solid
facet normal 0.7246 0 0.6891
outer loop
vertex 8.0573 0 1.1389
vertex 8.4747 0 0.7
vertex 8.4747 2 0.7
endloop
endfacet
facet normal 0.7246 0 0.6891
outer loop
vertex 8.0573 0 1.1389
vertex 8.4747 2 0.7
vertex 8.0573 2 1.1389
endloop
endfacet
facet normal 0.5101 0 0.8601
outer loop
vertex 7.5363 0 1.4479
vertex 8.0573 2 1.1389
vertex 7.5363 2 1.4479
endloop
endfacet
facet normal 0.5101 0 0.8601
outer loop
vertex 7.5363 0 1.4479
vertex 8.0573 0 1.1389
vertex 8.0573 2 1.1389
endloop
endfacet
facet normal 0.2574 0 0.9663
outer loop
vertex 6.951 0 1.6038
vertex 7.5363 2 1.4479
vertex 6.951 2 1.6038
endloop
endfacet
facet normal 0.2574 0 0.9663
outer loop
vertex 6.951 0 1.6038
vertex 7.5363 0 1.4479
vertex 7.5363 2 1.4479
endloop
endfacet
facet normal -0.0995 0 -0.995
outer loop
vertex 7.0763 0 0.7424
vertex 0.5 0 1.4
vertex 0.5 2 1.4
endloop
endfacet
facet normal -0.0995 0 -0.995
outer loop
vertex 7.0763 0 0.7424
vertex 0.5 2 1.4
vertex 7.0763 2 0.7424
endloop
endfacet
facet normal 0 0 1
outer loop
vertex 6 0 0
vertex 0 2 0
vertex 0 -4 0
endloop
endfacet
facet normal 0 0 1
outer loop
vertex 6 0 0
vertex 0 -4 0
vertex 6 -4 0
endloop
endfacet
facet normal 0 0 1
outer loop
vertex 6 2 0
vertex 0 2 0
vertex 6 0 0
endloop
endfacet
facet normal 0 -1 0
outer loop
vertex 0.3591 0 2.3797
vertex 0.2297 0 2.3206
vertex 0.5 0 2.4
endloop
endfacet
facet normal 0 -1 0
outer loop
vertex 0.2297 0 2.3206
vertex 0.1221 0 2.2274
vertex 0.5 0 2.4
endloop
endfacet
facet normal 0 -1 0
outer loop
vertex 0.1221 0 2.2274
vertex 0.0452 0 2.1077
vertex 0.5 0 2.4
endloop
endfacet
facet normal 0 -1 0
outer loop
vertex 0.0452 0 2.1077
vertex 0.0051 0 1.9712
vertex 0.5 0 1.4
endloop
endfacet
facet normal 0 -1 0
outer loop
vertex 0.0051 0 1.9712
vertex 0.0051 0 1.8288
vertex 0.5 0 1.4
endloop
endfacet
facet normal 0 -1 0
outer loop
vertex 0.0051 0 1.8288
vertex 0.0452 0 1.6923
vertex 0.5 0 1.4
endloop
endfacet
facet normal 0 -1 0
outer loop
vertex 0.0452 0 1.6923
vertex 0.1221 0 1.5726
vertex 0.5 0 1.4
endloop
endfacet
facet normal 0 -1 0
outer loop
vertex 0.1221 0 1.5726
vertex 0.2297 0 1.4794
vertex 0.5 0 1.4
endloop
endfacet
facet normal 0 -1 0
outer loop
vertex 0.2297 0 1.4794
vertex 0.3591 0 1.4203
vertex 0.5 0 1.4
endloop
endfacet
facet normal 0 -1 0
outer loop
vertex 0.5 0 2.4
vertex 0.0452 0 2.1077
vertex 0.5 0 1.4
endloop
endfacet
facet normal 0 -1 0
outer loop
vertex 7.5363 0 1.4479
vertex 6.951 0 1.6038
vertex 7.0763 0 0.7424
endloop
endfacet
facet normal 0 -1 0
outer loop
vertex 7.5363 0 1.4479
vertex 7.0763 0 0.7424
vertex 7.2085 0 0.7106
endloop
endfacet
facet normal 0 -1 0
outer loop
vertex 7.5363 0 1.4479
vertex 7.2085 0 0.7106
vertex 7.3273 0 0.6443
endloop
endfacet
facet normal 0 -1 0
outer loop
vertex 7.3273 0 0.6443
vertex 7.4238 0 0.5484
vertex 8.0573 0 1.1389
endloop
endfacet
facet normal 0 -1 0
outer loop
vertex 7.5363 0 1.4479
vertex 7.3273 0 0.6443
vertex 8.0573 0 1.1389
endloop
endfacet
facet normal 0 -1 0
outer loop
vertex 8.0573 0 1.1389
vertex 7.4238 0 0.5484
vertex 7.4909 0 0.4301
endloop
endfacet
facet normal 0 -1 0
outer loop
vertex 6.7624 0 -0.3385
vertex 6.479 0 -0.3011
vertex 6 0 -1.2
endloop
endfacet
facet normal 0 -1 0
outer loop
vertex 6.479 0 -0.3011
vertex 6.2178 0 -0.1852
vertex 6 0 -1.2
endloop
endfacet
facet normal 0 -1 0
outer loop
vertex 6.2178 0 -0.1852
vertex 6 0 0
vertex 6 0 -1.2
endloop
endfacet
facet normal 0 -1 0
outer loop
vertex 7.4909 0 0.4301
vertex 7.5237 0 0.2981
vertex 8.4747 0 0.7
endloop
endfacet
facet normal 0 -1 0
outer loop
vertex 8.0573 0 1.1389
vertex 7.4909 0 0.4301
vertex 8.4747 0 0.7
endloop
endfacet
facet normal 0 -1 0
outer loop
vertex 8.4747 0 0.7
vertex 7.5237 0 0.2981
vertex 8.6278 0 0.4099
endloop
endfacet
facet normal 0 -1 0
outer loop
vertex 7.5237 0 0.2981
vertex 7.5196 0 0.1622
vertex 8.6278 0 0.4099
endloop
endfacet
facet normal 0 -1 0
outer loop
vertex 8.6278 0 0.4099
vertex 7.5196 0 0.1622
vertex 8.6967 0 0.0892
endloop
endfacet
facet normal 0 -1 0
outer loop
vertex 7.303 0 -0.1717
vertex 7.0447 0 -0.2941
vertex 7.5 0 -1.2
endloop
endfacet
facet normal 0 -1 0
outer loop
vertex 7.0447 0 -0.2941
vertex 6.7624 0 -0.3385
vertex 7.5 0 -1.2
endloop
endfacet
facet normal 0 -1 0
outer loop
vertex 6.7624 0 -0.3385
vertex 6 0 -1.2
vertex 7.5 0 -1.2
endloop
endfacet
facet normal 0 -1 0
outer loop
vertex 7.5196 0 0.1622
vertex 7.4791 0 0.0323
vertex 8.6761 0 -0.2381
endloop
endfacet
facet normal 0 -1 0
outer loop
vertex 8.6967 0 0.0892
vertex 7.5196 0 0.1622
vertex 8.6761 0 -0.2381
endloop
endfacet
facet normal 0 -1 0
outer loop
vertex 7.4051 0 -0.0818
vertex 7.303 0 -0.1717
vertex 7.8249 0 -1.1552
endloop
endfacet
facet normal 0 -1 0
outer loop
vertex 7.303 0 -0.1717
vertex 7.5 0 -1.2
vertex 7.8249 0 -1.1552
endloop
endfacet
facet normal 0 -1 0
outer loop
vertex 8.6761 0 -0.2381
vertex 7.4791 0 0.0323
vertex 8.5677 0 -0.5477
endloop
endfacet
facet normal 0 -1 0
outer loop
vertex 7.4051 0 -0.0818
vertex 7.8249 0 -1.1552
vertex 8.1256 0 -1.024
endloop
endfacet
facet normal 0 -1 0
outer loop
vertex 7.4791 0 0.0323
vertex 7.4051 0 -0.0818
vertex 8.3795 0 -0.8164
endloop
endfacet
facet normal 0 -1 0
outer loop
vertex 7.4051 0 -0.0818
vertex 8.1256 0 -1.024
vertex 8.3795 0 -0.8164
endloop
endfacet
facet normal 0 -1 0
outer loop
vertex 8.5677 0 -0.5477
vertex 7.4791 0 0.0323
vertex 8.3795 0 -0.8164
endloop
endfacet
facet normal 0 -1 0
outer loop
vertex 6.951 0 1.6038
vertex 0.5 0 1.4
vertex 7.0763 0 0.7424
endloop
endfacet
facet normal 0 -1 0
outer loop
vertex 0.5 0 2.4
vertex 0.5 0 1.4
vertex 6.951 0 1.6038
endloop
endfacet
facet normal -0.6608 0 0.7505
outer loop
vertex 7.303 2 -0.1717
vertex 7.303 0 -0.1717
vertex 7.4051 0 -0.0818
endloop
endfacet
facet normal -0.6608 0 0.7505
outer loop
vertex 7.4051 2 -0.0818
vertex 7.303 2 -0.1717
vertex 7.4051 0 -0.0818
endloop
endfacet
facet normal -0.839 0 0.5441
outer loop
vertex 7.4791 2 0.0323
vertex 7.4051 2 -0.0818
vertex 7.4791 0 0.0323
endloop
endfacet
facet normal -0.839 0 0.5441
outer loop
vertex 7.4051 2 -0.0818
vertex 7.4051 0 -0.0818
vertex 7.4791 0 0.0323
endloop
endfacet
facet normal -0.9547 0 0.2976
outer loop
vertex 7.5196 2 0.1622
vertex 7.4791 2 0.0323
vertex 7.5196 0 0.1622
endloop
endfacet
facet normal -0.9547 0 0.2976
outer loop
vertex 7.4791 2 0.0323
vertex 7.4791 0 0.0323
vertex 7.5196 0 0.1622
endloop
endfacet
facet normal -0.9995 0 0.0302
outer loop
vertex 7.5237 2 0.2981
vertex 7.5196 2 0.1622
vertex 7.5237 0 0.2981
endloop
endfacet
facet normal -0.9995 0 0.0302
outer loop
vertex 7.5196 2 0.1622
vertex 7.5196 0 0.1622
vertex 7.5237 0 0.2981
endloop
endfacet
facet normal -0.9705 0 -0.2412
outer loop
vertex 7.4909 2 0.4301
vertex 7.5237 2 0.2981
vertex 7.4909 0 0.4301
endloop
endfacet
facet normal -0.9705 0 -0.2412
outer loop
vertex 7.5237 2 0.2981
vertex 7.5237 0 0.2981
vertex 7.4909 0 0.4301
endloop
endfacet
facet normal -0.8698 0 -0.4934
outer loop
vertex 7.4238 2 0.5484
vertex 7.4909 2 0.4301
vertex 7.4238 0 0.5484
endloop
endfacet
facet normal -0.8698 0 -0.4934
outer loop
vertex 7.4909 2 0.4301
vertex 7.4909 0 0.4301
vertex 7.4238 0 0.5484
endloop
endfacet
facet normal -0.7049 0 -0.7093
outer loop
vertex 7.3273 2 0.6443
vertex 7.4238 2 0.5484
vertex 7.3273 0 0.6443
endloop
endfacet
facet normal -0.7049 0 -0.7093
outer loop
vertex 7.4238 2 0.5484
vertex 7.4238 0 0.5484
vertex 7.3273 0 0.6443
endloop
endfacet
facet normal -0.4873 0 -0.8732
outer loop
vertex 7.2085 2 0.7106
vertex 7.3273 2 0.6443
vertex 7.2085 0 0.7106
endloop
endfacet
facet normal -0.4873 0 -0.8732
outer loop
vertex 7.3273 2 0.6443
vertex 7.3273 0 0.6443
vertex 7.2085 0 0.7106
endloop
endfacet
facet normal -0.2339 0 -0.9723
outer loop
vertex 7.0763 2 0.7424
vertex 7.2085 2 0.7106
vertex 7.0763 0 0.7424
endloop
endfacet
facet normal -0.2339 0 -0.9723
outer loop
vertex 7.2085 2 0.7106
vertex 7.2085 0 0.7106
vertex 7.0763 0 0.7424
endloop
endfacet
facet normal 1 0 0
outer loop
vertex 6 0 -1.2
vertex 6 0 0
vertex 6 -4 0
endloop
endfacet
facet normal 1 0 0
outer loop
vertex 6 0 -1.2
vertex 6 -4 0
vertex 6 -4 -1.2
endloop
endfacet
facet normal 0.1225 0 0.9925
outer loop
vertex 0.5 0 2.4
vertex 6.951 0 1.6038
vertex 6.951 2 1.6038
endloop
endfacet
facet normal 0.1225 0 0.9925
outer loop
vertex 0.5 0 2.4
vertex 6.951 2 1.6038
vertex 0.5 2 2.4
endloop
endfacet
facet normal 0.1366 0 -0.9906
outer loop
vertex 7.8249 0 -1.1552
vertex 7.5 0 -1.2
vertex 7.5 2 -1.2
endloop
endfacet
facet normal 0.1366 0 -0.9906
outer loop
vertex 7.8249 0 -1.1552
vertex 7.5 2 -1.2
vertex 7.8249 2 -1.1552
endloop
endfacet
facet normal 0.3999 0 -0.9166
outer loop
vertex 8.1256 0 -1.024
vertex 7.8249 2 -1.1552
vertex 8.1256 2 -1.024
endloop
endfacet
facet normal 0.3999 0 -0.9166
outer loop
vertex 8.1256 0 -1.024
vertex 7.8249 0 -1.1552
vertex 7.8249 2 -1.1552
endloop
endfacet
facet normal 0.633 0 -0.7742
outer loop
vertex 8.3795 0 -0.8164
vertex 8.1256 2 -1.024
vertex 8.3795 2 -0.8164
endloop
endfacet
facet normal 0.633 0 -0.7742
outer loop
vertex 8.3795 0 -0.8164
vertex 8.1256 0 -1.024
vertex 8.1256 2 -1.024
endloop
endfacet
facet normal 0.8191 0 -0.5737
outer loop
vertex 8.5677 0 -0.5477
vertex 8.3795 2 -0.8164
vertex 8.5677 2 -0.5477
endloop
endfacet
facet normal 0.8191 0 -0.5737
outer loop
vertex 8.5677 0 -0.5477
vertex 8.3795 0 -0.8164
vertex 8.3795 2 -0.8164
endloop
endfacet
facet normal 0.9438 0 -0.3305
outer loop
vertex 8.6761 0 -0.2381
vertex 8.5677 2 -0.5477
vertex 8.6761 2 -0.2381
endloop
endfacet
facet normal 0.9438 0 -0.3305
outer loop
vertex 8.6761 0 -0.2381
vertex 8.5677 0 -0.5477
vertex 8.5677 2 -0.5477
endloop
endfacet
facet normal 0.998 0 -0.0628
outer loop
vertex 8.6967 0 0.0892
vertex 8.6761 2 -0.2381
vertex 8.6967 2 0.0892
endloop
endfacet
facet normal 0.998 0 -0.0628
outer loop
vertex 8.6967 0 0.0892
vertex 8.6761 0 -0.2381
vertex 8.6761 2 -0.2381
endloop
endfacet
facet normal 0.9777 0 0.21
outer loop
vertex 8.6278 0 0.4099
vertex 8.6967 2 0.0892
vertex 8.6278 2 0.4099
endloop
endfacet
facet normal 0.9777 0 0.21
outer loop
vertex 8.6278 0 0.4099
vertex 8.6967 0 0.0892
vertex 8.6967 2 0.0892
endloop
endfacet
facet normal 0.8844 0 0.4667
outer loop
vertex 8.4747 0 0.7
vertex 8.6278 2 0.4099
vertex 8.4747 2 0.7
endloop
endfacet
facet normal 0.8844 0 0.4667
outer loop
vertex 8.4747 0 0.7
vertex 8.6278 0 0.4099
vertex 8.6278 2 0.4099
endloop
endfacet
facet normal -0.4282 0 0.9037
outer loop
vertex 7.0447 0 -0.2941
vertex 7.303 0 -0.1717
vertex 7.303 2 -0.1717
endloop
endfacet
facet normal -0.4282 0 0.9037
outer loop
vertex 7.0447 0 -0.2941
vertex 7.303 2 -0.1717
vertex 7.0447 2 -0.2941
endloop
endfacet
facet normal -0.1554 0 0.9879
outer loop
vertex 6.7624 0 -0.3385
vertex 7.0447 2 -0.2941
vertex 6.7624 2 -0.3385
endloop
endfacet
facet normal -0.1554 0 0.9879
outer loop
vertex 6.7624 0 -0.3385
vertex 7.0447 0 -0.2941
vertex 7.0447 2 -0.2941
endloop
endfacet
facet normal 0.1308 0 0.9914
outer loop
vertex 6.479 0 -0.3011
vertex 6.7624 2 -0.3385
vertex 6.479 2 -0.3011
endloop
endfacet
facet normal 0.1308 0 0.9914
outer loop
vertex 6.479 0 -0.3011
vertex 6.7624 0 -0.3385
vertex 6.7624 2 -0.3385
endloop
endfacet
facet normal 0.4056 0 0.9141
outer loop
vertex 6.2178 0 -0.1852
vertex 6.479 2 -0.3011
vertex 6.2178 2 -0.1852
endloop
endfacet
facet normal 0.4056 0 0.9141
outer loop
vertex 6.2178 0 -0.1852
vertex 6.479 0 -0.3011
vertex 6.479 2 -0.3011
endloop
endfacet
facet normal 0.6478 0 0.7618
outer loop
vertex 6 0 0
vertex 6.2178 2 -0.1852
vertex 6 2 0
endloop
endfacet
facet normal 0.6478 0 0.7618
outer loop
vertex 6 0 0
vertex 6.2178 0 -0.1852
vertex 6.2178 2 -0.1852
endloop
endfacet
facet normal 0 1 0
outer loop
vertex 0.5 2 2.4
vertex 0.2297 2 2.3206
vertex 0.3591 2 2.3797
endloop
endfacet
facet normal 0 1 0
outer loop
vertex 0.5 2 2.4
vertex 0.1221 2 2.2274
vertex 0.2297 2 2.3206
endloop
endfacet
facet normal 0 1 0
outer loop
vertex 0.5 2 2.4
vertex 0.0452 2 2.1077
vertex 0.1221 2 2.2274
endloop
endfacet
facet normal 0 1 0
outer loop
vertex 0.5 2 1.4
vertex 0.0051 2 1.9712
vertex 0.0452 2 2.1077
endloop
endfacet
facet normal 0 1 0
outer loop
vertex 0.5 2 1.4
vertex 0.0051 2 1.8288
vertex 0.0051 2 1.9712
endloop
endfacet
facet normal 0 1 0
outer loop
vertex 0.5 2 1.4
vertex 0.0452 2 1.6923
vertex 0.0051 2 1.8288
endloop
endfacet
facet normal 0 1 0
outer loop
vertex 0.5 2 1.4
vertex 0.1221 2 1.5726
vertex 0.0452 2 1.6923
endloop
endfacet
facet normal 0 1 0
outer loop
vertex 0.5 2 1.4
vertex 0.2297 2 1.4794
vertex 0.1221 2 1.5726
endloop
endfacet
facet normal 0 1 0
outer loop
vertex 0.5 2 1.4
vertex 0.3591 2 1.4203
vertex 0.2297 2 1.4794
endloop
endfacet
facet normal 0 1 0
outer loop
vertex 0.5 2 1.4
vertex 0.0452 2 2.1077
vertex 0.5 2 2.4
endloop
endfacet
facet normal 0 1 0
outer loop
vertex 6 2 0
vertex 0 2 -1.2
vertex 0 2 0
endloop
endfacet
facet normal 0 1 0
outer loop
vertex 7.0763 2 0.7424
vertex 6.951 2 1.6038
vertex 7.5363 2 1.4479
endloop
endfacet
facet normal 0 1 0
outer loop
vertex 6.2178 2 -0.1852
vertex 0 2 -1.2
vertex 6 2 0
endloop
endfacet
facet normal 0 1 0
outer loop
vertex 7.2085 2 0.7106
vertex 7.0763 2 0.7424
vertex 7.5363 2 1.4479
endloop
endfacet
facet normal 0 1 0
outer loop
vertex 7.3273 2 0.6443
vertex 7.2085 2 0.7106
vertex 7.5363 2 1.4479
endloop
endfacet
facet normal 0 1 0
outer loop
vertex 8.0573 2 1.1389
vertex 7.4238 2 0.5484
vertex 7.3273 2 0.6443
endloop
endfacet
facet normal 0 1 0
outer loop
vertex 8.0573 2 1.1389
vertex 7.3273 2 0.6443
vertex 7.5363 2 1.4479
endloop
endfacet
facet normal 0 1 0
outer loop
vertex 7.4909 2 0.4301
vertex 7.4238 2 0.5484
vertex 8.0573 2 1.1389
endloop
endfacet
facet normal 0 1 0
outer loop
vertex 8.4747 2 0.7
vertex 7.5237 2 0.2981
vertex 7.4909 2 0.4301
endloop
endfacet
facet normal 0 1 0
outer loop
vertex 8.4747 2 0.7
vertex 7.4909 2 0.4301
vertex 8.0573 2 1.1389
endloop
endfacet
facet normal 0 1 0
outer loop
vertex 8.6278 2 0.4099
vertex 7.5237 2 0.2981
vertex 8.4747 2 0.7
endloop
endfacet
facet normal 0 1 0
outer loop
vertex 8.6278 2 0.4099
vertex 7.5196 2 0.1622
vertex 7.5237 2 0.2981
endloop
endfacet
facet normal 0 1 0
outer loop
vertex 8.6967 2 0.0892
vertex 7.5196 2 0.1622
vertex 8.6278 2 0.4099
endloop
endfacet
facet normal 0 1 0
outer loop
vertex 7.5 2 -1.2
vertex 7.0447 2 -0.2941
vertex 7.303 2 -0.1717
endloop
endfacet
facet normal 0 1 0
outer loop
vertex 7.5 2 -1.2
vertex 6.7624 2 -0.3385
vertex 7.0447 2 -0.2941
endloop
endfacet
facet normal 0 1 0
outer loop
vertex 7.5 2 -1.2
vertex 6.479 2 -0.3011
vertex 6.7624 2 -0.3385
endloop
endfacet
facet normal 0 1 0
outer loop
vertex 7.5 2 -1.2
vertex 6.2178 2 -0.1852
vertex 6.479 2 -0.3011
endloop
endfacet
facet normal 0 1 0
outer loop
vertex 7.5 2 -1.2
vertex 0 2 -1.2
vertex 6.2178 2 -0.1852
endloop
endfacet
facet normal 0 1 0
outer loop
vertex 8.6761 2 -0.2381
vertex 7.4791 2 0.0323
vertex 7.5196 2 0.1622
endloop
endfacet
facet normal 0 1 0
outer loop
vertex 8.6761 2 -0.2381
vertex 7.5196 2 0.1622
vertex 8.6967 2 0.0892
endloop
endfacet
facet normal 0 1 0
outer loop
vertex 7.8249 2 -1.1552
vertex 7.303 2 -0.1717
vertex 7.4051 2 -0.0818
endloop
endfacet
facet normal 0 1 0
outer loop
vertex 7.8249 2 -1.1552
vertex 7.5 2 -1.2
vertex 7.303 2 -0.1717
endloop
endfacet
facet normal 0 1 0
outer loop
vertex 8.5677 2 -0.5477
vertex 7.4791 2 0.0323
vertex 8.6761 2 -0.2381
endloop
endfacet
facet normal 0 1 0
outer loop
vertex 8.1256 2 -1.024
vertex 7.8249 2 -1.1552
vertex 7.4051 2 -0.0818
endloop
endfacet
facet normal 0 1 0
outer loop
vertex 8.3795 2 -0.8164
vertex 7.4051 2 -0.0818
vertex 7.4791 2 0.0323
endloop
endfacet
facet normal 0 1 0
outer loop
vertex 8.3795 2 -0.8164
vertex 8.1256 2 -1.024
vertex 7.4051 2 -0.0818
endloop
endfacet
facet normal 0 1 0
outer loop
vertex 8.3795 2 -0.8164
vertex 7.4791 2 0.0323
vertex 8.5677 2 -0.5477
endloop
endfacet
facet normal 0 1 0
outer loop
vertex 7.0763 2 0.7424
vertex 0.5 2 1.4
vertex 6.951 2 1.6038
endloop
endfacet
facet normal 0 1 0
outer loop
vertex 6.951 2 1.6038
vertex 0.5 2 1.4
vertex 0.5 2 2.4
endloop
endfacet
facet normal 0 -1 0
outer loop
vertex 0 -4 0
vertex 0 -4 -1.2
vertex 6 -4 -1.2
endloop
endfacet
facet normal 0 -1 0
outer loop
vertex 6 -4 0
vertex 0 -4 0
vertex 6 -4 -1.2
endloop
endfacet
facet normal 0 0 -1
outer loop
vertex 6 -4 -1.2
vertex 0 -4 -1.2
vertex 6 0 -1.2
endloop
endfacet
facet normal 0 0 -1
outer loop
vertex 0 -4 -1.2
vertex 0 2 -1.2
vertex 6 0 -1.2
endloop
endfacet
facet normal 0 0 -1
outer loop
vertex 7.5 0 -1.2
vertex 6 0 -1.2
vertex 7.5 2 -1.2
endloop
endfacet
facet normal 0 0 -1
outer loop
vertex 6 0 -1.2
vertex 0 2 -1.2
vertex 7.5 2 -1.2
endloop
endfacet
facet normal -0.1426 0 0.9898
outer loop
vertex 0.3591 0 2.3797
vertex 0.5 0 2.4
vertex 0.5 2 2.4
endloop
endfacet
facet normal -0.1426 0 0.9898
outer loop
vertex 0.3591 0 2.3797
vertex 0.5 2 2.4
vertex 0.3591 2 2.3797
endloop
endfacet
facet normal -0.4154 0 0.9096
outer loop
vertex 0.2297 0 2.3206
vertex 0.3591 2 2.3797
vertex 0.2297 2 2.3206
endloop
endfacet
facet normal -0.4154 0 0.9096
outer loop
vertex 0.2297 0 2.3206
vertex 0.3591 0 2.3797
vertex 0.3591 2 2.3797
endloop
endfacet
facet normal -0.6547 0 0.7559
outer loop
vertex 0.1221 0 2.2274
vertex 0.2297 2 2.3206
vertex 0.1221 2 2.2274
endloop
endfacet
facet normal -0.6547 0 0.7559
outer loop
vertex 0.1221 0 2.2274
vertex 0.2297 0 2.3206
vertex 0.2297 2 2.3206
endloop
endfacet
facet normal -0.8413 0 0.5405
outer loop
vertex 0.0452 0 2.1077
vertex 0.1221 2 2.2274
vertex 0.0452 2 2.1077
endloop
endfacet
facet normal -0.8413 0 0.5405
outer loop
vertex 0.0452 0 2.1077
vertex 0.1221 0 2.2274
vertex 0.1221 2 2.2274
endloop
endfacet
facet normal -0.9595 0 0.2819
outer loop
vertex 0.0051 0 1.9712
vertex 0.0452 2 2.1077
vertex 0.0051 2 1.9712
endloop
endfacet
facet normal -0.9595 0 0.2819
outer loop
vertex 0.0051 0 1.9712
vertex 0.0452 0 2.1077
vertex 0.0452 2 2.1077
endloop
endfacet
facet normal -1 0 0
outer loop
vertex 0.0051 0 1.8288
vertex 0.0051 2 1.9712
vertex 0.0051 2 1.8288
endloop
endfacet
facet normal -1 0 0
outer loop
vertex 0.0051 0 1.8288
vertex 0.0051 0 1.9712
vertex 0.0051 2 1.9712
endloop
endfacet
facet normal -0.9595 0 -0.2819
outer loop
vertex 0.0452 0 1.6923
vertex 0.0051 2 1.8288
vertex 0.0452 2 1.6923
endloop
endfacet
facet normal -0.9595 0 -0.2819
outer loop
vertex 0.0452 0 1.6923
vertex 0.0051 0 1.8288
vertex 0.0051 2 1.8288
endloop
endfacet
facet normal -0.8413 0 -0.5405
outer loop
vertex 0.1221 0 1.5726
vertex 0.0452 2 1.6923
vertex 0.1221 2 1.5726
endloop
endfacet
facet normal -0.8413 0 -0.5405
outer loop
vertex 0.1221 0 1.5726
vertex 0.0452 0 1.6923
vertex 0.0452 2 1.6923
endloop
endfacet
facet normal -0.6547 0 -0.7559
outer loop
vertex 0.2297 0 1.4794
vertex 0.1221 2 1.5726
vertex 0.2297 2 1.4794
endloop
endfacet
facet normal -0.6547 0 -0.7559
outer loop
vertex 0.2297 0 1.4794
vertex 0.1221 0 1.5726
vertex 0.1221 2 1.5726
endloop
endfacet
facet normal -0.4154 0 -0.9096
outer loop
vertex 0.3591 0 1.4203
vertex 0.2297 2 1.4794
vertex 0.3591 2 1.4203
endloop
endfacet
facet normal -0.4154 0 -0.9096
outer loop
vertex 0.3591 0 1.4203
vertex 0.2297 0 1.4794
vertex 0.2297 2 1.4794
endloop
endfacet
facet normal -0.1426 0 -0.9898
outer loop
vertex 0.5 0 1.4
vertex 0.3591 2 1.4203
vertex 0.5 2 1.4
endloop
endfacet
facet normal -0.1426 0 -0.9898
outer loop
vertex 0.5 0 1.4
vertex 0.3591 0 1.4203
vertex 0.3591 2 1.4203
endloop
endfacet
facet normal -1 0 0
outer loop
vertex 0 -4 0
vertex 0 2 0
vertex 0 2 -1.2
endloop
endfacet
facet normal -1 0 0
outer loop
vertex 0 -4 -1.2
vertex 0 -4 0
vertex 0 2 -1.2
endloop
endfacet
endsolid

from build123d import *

# Parameters (mm, degrees)
BOSS_EXTRUDE1_DEPTH = 2
SKETCH2_W           = 6
SKETCH2_H           = 1.2
BOSS_EXTRUDE2_DEPTH = 4
FILLET1_DEPTH       = 2


with BuildPart() as part:
    # Sketch1 → Boss-Extrude1 (new body)
    with BuildSketch(Plane(origin=(0, 0, 0), x_dir=(1, 0, 0), z_dir=(0, 1, 0))):
        with BuildLine():
            Line((0, 1.2), (7.5, 1.2))
            ThreePointArc((7.5, 1.2), (8.567707825, 0.547722558), (8.474679434, -0.7))
            ThreePointArc((8.474679434, -0.7), (7.807430734, -1.311314361), (6.951049145, -1.603780854))
            Line((6.951049145, -1.603780854), (0.5, -2.4))
            ThreePointArc((0.5, -2.4), (0, -1.9), (0.5, -1.4))
            Line((0.5, -1.4), (7.5, -0.7))
            ThreePointArc((7.5, -0.7), (7.642928579, -0.35), (7.5, 0))
            ThreePointArc((7.5, 0), (6.75, 0.338562172), (6, 0))
            Line((6, 0), (0, 0))
            Line((0, 0), (0, 1.2))
        make_face()
    extrude(amount=BOSS_EXTRUDE1_DEPTH)

    # Sketch2 → Boss-Extrude2 (add)
    with BuildSketch(Plane(origin=(0, 0, 0), x_dir=(1, 0, 0), z_dir=(0, 1, 0))):
        with Locations((3, 0.6)):
            Rectangle(SKETCH2_W, SKETCH2_H)
    extrude(amount=-BOSS_EXTRUDE2_DEPTH)

    # Fillet1: read off the stored shape, not the designer's step
    # Fillet1 outline → Fillet1 (add)
    with BuildSketch(Plane(origin=(0, 0, 0), x_dir=(1, 0, 0), z_dir=(0, 1, 0))):
        with BuildLine():
            ThreePointArc((7.5, 0), (7.407145524, 0.092325902), (7.303023614, 0.171727751))
            ThreePointArc((7.303023614, 0.171727751), (7.511802782, -0.365240542), (7.076263667, -0.742373633))
            Line((7.076263667, -0.742373633), (7.5, -0.7))
            ThreePointArc((7.5, -0.7), (7.642928579, -0.35), (7.5, 0))
        make_face()
    extrude(amount=FILLET1_DEPTH)


solid = part.part
